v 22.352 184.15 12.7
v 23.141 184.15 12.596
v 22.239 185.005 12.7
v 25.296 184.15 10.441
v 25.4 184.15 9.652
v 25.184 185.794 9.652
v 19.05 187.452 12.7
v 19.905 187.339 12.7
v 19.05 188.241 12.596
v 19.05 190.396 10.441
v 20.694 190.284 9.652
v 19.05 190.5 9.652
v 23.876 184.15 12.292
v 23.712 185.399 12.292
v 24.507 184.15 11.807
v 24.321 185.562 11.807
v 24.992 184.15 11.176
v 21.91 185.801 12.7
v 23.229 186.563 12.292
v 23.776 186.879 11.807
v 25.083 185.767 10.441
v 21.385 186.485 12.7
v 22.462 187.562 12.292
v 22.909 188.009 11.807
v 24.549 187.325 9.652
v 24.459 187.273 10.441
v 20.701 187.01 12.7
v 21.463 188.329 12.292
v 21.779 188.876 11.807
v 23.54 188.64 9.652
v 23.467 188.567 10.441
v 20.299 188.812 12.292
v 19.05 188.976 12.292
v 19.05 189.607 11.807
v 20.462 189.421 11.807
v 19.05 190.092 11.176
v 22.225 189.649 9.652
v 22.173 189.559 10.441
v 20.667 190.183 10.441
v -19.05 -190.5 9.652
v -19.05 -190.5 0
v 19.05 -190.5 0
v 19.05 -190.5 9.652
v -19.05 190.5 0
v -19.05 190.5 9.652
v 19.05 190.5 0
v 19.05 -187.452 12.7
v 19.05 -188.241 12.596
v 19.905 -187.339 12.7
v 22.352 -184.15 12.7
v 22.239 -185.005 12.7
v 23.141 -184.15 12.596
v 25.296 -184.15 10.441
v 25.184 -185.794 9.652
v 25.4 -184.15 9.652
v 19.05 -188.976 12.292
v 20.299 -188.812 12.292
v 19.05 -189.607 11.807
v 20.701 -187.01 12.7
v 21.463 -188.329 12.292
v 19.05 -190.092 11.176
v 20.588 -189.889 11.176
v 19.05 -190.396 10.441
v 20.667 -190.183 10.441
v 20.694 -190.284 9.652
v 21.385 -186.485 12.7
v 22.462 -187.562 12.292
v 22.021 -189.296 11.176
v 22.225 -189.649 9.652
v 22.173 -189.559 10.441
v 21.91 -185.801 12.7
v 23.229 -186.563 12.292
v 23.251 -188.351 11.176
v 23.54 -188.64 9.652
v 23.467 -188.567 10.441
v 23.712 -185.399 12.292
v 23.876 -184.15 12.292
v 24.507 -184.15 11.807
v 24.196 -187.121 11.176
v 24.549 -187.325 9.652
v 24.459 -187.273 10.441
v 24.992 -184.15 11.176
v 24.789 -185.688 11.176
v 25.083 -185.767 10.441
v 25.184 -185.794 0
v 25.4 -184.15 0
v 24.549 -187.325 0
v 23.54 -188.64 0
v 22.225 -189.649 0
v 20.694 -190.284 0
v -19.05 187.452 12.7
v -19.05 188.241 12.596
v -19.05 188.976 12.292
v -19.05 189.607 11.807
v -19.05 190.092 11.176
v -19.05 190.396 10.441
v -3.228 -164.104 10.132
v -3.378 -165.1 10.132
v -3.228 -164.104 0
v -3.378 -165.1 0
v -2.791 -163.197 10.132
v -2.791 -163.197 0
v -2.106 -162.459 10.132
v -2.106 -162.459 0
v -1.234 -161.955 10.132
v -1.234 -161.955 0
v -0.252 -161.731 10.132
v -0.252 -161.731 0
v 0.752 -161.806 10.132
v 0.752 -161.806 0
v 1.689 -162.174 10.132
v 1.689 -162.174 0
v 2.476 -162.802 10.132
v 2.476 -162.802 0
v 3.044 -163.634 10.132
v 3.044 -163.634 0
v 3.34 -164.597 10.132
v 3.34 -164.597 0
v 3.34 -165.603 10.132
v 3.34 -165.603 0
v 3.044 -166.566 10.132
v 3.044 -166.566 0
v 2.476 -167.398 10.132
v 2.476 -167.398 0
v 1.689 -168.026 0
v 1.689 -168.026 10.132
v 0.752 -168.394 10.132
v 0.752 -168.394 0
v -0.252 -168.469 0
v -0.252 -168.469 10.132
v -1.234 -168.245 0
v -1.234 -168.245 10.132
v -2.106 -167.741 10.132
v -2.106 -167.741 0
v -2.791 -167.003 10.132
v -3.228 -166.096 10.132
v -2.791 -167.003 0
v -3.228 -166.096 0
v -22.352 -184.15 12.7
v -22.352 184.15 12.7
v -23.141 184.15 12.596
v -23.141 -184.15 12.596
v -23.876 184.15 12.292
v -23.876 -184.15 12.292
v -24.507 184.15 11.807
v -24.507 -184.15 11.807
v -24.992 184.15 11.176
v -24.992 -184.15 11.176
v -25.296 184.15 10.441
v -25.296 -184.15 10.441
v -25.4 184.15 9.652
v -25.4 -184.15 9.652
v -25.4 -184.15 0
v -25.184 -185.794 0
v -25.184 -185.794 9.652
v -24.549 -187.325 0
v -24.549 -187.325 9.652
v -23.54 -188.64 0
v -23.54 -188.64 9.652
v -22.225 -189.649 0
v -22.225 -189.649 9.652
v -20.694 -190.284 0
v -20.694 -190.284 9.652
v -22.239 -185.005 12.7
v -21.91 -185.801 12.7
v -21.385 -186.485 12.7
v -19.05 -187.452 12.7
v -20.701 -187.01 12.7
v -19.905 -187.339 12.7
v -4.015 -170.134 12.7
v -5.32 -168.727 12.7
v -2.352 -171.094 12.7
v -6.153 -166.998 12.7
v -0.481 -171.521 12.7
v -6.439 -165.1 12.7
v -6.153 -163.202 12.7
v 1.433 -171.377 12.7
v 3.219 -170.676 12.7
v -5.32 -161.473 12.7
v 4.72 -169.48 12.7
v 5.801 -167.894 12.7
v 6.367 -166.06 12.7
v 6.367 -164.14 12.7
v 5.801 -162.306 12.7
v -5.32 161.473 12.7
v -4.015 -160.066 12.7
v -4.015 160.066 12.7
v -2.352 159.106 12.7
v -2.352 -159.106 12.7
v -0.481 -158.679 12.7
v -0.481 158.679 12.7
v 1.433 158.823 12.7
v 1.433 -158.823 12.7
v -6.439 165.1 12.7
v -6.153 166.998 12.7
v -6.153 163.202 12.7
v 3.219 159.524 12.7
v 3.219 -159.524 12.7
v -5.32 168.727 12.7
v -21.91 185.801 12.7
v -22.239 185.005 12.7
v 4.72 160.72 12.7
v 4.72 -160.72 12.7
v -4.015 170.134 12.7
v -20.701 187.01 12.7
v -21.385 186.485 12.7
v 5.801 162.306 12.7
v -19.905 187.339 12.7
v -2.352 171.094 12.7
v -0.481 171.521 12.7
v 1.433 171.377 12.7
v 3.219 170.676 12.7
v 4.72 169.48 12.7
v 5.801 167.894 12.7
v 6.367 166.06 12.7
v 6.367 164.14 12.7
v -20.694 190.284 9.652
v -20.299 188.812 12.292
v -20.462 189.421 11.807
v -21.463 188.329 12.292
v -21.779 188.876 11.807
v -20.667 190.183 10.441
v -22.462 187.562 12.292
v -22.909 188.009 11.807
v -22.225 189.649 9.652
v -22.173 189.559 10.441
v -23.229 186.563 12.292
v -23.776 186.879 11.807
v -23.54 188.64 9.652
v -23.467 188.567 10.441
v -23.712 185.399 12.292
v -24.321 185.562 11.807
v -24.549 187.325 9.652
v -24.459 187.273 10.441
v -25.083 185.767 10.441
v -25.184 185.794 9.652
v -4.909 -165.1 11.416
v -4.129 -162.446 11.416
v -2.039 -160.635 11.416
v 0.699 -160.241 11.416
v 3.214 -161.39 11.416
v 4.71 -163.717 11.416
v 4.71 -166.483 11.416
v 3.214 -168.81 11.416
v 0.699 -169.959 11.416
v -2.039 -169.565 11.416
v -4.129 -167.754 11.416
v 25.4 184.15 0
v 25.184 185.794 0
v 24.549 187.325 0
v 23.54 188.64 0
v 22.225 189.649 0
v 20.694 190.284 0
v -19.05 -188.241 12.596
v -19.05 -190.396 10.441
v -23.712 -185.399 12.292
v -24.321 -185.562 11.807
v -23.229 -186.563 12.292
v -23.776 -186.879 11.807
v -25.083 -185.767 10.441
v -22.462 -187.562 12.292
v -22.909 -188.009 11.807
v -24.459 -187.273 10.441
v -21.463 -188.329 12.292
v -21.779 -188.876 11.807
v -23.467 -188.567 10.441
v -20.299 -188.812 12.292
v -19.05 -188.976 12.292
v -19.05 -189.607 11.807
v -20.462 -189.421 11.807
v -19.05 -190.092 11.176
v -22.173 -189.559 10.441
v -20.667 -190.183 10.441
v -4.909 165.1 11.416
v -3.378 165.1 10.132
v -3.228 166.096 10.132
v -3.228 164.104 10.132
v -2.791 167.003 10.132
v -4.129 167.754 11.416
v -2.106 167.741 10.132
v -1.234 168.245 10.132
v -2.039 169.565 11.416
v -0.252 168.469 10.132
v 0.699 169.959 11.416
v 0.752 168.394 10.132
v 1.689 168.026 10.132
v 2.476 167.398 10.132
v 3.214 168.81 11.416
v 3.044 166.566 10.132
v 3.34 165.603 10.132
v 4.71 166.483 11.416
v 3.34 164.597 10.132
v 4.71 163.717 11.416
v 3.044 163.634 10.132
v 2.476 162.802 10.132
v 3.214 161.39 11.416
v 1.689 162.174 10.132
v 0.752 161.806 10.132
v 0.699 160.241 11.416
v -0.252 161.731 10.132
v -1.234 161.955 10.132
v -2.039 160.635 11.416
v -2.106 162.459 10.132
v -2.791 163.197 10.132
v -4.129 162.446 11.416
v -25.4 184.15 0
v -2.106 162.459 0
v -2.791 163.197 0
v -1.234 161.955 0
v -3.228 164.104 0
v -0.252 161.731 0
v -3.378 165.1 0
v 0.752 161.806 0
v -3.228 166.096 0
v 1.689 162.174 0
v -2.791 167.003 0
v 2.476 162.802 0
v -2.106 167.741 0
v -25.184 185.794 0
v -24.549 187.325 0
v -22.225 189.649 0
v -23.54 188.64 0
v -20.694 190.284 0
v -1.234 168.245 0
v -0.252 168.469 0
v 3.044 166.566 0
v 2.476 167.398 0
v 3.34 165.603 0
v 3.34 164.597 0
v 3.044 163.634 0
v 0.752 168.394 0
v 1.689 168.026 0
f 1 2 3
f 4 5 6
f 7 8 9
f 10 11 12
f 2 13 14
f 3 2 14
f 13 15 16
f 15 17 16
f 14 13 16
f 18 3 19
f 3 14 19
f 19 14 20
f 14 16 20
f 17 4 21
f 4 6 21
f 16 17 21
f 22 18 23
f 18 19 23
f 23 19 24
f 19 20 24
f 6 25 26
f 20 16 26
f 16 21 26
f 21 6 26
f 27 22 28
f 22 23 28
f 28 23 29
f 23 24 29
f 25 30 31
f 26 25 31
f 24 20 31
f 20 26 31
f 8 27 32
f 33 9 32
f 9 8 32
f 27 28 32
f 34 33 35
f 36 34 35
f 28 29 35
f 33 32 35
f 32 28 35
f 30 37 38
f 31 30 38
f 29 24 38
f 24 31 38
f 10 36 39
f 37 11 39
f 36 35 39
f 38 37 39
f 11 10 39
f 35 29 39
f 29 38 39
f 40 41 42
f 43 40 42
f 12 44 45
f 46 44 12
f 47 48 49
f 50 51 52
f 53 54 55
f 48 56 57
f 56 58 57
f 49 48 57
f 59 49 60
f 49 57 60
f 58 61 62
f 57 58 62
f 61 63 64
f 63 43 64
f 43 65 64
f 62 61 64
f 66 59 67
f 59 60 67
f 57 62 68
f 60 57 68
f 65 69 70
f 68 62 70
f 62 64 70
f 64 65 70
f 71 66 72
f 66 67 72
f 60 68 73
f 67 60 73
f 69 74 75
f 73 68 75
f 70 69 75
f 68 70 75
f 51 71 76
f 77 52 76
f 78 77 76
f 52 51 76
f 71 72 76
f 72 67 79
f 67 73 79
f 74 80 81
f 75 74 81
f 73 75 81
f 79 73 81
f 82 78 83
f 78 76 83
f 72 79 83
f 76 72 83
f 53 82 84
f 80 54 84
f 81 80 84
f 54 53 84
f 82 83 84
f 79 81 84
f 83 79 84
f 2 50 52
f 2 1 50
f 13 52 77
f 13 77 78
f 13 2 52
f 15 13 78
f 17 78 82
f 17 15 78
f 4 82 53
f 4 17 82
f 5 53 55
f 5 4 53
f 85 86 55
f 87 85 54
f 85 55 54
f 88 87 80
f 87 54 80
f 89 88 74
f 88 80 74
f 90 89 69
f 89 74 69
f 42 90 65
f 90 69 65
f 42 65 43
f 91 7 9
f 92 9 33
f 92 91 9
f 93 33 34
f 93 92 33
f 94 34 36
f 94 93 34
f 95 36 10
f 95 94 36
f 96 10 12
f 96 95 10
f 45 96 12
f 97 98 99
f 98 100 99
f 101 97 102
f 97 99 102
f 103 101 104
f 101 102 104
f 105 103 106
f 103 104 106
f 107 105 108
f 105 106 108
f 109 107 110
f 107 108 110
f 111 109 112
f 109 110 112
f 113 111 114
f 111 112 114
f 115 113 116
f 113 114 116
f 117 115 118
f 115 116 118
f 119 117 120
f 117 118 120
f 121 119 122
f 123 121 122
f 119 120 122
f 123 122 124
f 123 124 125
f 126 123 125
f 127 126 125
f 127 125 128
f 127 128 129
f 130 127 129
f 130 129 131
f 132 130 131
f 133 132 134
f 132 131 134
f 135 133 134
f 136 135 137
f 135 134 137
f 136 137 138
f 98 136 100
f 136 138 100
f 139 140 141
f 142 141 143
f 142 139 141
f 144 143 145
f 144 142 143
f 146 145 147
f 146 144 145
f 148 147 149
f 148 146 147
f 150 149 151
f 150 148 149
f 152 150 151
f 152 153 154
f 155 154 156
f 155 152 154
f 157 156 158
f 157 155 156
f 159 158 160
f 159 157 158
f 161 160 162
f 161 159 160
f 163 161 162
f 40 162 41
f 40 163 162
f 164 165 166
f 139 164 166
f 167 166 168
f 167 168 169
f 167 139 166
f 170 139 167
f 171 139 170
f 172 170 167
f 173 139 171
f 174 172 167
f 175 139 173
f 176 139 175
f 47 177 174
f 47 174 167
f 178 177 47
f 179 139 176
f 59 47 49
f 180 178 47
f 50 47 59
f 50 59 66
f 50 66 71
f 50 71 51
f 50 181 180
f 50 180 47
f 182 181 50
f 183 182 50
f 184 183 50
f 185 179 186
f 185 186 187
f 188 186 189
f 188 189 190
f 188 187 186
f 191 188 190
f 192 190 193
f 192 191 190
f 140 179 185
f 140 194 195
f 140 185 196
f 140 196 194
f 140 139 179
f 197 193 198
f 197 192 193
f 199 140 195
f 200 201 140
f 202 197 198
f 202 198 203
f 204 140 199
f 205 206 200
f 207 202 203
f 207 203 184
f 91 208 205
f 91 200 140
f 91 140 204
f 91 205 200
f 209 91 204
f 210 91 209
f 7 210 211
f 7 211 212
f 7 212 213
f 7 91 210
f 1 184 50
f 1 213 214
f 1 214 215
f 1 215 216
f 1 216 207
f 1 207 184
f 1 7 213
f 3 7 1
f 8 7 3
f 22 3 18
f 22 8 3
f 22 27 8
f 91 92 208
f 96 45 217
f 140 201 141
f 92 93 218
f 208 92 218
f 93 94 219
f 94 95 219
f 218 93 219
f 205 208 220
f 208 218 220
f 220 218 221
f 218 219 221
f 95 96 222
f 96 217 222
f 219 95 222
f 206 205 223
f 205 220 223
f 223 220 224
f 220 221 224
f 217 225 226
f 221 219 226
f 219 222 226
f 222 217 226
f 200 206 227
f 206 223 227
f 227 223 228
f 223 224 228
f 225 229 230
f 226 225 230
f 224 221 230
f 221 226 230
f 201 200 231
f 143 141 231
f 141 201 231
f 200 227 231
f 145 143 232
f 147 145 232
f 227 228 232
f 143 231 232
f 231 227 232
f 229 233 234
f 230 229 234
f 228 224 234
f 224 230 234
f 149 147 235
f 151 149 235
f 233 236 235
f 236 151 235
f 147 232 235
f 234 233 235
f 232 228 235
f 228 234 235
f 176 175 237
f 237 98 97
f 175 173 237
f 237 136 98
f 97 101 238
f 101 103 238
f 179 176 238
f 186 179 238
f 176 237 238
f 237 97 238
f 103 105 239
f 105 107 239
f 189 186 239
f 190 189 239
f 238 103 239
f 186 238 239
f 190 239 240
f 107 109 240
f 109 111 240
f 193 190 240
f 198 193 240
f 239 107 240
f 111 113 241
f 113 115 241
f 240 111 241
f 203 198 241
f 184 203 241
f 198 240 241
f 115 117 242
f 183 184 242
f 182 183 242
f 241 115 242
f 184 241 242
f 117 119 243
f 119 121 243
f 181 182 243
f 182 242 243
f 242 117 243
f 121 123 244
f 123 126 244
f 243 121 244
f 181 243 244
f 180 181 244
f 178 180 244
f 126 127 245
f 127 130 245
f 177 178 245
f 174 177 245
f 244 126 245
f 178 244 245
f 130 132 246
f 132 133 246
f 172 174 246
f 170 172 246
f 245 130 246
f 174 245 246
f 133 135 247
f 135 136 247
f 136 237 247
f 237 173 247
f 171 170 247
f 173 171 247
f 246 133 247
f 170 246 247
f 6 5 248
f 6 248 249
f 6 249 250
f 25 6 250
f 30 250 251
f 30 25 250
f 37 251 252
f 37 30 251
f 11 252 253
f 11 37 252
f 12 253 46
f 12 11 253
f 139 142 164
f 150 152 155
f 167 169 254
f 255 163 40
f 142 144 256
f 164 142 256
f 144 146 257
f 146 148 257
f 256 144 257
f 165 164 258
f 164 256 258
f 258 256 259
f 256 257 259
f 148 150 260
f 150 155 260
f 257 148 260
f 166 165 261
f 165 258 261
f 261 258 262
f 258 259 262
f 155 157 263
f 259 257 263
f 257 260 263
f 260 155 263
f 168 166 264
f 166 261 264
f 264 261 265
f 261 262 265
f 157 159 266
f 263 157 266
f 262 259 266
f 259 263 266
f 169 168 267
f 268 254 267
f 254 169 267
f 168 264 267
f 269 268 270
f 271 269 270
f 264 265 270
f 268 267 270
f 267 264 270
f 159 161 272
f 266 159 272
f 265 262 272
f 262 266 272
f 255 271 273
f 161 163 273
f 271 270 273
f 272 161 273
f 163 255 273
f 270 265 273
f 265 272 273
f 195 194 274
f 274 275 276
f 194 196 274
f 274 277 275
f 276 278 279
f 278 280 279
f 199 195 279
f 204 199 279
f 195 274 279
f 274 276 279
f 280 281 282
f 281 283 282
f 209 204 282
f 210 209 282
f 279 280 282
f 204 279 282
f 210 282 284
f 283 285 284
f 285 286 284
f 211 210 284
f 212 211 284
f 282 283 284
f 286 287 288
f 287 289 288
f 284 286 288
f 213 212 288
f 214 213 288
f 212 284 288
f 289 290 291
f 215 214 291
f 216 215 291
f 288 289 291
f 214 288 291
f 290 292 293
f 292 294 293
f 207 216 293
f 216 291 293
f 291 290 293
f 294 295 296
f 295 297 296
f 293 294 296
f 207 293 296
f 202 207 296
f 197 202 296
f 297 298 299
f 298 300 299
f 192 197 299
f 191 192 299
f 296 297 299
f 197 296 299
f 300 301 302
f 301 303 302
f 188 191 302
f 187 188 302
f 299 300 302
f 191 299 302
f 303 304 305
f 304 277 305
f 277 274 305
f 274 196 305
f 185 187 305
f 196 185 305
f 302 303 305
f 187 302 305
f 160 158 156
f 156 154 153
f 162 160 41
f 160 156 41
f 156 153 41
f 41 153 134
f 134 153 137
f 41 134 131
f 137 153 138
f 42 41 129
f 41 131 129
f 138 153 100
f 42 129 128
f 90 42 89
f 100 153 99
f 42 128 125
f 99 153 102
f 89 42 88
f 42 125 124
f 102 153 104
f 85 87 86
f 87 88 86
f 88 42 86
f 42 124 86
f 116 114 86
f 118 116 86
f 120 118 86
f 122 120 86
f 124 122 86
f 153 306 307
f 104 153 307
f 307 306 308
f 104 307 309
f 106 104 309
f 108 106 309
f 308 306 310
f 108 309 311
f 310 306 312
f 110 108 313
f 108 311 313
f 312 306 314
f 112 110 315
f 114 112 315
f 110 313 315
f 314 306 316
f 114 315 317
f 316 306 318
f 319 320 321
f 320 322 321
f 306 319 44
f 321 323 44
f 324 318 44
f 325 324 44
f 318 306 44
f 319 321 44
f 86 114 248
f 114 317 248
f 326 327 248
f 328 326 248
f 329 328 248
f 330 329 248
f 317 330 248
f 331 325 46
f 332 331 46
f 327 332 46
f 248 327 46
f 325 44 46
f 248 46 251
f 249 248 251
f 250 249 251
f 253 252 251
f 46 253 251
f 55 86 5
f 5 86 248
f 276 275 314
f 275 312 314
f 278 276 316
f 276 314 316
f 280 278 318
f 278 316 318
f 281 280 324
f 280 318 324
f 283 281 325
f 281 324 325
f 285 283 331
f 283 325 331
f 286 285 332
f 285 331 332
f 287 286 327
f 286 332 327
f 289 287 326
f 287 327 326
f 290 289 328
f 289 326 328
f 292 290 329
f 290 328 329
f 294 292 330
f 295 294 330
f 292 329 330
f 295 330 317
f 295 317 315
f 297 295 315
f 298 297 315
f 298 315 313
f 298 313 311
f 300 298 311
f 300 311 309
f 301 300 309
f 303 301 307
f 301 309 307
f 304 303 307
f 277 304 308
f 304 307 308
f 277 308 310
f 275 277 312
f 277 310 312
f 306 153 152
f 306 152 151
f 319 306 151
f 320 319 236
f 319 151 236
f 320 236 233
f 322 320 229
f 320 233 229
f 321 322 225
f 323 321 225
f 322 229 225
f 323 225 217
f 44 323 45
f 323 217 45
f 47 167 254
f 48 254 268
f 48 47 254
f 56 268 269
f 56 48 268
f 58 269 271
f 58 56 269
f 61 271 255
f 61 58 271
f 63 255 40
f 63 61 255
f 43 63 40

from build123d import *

# Parameters (mm, degrees)
SKETCH1_W                                           = 50.8
SKETCH1_H                                           = 381
BASE_EXTRUDE_DEPTH                                  = 12.7
CSK_FOR_1_4_FLAT_HEAD_MACHINE_SCREW_100_D           = 6.7564
CSK_FOR_1_4_FLAT_HEAD_MACHINE_SCREW_100_CSINK_D     = 12.8778
CSK_FOR_1_4_FLAT_HEAD_MACHINE_SCREW_100_CSINK_ANGLE = 100
FILLET1_R                                           = 6.35
FILLET2_R                                           = 3.048


with BuildPart() as part:
    # Sketch1 → Base-Extrude (new body)
    with BuildSketch(Plane.XY):
        Rectangle(SKETCH1_W, SKETCH1_H)
    extrude(amount=BASE_EXTRUDE_DEPTH)

    # CSK for 1/4 Flat Head Machine Screw (100)1 (through all)
    with Locations(Plane.XY.offset(12.7)):
        with Locations((0, 165.1), (0, -165.1)):
            CounterSinkHole(CSK_FOR_1_4_FLAT_HEAD_MACHINE_SCREW_100_D / 2, CSK_FOR_1_4_FLAT_HEAD_MACHINE_SCREW_100_CSINK_D / 2, counter_sink_angle=CSK_FOR_1_4_FLAT_HEAD_MACHINE_SCREW_100_CSINK_ANGLE)

    # Fillet1
    fillet1_edges = [part.edges().sort_by_distance(p)[0] for p in [
        (25.4, -190.5, 6.35),
        (-25.4, -190.5, 6.35),
        (-25.4, 190.5, 6.35),
        (25.4, 190.5, 6.35),
    ]]
    fillet(fillet1_edges, radius=FILLET1_R)

    # Fillet2
    fillet2_edges = [part.edges().sort_by_distance(p)[0] for p in [
        (25.4, 0, 12.7),
        (0, -190.5, 12.7),
        (0, 190.5, 12.7),
        (-25.4, 0, 12.7),
        (23.540128061, 188.640128061, 12.7),
        (-23.540128061, 188.640128061, 12.7),
        (-23.540128061, -188.640128061, 12.7),
        (23.540128061, -188.640128061, 12.7),
    ]]
    fillet(fillet2_edges, radius=FILLET2_R)


solid = part.part
